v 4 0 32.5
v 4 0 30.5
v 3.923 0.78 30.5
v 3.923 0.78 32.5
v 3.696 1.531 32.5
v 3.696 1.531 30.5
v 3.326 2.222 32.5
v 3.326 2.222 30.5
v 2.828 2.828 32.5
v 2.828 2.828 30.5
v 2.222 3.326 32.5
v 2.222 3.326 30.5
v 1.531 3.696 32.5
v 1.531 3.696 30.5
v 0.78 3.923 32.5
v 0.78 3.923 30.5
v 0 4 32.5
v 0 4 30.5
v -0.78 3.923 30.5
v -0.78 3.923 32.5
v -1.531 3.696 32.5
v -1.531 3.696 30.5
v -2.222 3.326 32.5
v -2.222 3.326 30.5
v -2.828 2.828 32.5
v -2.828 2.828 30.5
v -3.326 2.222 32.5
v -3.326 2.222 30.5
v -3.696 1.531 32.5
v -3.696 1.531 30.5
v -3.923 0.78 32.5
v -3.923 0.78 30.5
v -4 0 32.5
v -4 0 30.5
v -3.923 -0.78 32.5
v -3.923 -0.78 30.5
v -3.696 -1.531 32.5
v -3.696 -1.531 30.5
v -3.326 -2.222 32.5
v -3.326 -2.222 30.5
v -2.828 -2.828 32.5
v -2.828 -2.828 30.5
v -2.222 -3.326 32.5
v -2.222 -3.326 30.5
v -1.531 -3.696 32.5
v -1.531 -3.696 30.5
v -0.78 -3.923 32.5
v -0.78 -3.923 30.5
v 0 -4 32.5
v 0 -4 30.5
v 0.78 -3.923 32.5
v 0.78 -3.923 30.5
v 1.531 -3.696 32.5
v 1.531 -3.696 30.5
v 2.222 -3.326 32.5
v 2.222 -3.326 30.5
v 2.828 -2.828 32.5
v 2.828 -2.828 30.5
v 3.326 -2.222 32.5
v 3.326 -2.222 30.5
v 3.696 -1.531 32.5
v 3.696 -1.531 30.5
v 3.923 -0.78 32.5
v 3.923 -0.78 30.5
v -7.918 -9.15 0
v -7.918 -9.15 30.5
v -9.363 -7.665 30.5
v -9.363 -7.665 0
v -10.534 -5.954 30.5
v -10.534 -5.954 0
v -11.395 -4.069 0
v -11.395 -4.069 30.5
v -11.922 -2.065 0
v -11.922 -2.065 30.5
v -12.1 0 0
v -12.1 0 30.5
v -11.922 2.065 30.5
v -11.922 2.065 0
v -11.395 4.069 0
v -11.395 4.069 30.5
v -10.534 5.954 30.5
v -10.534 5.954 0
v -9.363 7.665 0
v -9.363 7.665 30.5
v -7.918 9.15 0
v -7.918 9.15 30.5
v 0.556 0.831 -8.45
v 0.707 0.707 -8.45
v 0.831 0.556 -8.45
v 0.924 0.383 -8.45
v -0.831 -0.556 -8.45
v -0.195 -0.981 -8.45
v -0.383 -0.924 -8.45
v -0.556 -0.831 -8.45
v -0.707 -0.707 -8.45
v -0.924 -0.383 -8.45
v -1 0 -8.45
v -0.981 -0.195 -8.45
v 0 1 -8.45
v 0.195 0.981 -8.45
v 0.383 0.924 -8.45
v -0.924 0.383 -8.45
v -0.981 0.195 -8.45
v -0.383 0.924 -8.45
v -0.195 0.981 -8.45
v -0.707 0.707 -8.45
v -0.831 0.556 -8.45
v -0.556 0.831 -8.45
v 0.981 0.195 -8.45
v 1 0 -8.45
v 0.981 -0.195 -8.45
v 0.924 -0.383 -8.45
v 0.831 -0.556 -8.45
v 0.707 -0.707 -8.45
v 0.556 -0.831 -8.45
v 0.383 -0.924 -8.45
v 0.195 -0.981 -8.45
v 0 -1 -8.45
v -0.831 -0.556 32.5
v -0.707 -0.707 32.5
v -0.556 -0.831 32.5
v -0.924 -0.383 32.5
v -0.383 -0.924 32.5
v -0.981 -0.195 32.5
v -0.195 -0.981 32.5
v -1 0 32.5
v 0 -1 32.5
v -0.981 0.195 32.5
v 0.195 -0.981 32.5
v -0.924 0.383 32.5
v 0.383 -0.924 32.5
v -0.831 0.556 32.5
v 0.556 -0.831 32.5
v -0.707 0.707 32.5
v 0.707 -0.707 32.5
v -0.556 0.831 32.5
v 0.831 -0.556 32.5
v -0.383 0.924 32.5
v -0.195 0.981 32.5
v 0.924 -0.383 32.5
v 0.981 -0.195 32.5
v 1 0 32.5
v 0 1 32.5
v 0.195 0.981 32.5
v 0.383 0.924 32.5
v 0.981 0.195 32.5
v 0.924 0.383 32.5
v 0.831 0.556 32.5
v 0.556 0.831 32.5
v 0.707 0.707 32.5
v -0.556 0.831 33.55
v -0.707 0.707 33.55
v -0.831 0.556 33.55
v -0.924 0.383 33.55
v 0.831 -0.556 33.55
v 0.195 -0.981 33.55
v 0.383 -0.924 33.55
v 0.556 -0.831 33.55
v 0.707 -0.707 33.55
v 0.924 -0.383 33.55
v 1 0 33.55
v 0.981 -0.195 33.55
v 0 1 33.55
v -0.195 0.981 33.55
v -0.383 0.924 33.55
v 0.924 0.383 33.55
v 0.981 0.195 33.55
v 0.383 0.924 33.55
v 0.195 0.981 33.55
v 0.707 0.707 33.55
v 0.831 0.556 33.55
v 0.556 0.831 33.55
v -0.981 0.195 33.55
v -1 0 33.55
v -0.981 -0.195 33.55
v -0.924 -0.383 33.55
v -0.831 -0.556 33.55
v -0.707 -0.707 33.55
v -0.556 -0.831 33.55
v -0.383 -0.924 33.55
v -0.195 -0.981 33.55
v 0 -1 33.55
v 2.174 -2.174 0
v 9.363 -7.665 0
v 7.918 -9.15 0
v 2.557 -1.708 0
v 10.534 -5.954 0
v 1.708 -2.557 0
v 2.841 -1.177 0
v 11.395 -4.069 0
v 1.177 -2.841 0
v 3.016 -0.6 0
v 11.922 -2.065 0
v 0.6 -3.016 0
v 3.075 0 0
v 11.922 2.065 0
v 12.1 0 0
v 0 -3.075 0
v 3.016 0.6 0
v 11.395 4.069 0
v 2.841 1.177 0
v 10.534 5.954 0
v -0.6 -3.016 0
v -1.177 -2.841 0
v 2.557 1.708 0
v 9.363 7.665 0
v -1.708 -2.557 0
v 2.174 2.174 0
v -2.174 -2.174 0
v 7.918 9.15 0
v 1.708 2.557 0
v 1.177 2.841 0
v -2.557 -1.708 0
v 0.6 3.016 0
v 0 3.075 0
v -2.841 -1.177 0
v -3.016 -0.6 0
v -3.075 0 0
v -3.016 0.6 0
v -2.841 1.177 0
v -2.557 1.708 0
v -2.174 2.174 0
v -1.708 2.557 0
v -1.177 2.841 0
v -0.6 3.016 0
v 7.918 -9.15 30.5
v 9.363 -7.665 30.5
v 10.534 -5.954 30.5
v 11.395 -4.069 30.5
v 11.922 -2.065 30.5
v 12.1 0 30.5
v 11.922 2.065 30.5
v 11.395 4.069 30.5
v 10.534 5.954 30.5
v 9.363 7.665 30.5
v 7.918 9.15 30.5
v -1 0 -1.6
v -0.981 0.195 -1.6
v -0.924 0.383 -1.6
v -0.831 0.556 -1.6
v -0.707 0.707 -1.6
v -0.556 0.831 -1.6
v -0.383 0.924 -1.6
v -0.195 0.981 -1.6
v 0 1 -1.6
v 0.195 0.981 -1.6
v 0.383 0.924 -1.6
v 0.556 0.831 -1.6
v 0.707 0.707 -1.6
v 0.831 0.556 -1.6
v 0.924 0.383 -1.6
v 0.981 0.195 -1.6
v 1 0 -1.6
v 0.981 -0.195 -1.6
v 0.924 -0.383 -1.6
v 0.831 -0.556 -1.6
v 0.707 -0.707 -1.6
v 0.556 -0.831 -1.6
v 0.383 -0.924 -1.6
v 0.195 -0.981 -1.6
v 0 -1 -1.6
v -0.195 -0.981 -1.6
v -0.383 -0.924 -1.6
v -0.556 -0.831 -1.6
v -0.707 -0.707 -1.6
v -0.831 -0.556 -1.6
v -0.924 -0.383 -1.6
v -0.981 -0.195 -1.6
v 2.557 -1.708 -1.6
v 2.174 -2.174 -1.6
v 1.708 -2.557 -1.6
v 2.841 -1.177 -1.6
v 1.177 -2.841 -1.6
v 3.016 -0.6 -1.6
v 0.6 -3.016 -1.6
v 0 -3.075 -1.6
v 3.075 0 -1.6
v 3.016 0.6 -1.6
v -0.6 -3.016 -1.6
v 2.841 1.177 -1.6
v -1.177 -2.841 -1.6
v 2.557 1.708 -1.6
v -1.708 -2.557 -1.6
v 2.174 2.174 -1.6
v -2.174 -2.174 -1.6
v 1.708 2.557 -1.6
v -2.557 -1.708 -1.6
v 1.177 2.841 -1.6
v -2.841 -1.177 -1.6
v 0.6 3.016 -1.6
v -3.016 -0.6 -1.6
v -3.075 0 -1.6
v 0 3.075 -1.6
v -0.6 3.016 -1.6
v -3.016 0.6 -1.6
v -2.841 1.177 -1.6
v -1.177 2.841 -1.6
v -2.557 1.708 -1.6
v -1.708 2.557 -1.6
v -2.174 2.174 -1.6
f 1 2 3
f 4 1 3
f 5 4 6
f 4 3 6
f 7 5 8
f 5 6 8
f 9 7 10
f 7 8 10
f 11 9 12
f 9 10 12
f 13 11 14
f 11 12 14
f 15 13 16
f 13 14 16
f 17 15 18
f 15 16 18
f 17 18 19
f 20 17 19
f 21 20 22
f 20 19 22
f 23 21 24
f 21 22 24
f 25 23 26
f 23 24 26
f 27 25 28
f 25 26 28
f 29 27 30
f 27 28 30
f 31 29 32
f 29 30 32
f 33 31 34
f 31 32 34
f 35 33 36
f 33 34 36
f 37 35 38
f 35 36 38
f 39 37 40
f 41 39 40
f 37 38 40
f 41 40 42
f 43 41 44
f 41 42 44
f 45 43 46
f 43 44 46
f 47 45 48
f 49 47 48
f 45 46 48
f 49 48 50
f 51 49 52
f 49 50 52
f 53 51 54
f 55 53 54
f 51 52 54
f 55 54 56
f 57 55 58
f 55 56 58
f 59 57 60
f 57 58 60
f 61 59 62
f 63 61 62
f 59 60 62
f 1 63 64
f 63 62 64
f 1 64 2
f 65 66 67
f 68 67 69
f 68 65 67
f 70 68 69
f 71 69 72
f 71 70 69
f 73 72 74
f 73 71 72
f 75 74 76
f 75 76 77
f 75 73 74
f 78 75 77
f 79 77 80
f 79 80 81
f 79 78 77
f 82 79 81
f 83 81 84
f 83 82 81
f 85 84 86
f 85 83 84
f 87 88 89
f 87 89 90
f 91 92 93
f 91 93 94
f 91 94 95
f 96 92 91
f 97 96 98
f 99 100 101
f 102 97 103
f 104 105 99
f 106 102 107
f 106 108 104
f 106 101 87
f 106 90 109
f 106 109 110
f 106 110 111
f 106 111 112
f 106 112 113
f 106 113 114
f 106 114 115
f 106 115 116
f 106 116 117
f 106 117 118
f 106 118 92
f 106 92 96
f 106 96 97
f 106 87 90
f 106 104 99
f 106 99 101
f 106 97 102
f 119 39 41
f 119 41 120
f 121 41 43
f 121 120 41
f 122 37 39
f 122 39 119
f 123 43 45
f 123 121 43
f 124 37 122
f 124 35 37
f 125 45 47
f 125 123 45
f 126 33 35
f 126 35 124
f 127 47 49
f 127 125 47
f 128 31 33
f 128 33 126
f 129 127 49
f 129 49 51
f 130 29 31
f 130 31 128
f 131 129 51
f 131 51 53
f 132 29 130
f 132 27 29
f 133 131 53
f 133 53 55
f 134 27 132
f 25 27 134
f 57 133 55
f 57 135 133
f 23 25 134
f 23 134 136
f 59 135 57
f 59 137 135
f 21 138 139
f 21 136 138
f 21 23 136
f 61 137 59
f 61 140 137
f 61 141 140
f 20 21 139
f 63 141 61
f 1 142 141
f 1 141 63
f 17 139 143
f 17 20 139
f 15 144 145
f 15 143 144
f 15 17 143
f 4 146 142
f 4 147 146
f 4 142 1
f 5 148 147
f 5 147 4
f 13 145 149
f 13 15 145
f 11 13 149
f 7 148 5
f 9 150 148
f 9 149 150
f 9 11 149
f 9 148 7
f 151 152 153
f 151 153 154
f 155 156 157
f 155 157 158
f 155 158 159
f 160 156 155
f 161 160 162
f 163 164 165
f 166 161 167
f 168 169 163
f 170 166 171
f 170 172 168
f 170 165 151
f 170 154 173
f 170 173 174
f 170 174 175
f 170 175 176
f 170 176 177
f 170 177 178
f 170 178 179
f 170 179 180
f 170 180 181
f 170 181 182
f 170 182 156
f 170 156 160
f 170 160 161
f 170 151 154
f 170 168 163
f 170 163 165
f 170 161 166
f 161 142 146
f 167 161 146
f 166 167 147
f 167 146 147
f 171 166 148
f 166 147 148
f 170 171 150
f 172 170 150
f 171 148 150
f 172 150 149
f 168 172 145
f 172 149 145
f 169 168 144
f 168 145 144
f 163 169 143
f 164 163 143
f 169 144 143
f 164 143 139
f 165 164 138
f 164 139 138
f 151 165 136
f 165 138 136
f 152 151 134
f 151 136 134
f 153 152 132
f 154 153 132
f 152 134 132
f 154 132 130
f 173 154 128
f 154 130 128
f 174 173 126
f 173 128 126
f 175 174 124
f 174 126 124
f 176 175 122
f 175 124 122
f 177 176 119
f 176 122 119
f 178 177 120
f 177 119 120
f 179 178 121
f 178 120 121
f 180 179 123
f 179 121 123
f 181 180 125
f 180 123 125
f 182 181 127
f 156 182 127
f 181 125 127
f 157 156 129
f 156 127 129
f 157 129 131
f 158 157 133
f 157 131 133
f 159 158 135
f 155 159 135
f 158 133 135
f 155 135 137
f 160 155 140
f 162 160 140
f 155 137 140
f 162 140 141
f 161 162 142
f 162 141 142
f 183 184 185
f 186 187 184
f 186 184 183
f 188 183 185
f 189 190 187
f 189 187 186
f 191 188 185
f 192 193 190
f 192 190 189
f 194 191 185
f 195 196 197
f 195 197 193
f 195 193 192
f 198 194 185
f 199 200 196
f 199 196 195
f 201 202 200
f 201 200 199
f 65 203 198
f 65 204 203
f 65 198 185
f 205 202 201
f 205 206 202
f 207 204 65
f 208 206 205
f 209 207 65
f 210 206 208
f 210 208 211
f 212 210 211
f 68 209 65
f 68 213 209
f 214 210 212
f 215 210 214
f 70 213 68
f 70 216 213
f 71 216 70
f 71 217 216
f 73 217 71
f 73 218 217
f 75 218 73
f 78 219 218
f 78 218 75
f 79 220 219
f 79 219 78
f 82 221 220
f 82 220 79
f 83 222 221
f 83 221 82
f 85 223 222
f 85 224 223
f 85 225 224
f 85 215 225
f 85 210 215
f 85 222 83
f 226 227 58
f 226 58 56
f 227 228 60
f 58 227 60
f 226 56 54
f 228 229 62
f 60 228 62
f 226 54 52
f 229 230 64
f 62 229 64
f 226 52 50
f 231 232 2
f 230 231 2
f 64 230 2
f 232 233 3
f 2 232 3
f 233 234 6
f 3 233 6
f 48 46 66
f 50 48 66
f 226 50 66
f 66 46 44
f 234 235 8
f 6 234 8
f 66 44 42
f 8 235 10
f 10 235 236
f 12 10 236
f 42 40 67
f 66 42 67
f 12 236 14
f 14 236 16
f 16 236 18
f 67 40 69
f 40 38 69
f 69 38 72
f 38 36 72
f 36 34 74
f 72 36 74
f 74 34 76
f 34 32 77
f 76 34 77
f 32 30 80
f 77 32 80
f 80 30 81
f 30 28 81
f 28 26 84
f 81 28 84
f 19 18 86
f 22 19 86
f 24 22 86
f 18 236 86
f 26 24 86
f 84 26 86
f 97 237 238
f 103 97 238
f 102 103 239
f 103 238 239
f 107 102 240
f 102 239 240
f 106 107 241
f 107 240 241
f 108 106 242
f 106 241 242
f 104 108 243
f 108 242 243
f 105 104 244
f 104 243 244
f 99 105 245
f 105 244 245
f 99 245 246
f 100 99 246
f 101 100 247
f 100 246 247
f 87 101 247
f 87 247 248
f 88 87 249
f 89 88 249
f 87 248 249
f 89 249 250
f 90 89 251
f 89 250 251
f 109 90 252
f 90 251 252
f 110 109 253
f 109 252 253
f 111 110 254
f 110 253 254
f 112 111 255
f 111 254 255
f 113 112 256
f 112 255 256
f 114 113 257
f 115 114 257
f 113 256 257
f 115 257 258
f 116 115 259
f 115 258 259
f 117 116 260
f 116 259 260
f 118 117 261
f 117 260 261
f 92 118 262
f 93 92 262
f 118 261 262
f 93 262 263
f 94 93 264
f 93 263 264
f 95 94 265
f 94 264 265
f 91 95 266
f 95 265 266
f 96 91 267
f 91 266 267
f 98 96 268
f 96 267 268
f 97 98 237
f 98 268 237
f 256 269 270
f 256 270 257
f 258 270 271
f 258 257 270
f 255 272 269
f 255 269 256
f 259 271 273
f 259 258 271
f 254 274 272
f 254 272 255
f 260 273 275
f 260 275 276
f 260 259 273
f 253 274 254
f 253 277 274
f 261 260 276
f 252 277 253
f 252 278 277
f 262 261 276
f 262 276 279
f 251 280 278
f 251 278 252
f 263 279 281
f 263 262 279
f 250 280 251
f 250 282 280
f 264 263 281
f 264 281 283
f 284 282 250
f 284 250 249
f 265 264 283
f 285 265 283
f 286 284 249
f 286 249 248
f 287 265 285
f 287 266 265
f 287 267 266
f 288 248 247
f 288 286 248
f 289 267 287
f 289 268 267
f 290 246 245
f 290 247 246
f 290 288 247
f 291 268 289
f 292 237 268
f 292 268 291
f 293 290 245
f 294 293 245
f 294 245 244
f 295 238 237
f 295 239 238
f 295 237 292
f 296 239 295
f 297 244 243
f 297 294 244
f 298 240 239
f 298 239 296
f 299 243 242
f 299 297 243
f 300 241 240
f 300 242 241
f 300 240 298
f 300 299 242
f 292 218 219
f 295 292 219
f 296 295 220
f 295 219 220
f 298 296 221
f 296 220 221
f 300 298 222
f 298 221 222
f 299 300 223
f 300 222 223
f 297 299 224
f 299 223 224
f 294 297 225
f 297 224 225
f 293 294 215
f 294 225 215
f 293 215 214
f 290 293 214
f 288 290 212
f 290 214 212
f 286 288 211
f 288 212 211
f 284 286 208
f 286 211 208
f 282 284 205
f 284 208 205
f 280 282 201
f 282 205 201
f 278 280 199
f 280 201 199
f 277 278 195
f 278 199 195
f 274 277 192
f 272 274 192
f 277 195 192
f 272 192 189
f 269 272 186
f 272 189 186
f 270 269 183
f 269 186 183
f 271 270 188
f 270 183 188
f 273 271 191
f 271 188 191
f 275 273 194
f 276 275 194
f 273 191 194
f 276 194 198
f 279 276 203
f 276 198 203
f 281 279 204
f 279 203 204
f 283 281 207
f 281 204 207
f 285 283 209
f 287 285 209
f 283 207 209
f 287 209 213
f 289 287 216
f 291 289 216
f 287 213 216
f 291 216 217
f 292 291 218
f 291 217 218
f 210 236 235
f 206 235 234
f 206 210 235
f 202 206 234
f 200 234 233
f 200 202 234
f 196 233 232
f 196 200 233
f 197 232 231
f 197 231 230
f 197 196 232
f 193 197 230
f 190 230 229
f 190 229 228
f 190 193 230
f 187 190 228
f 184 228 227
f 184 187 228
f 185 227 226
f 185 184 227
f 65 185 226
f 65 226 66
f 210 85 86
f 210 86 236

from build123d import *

# Parameters (mm, degrees)
BOSS_EXTRUDE1_DEPTH = 30.5
SKETCH2_R           = 3.075
BOSS_EXTRUDE2_DEPTH = 1.6
SKETCH3_R           = 1
BOSS_EXTRUDE3_DEPTH = 6.85
SKETCH4_R           = 4
BOSS_EXTRUDE4_DEPTH = 2
SKETCH5_R           = 1
BOSS_EXTRUDE5_DEPTH = 1.05


with BuildPart() as part:
    # Sketch1 → Boss-Extrude1 (new body)
    with BuildSketch(Plane.XY):
        with BuildLine():
            Line((-7.917543811, 9.15), (7.917543811, 9.15))
            ThreePointArc((7.917543811, 9.15), (12.1, 0), (7.917543811, -9.15))
            Line((7.917543811, -9.15), (-7.917543811, -9.15))
            ThreePointArc((-7.917543811, -9.15), (-12.1, 0), (-7.917543811, 9.15))
        make_face()
    extrude(amount=BOSS_EXTRUDE1_DEPTH)

    # Sketch2 → Boss-Extrude2 (add)
    with BuildSketch(Plane(origin=(0, 0, 0), x_dir=(-1, 0, 0), z_dir=(0, 0, -1))):
        Circle(SKETCH2_R)
    extrude(amount=BOSS_EXTRUDE2_DEPTH)

    # Sketch3 → Boss-Extrude3 (add)
    with BuildSketch(Plane(origin=(0, 0, -1.6), x_dir=(-1, 0, 0), z_dir=(0, 0, -1))):
        Circle(SKETCH3_R)
    extrude(amount=BOSS_EXTRUDE3_DEPTH)

    # Sketch4 → Boss-Extrude4 (add)
    with BuildSketch(Plane.XY.offset(30.5)):
        Circle(SKETCH4_R)
    extrude(amount=BOSS_EXTRUDE4_DEPTH)

    # Sketch5 → Boss-Extrude5 (add)
    with BuildSketch(Plane.XY.offset(32.5)):
        Circle(SKETCH5_R)
    extrude(amount=BOSS_EXTRUDE5_DEPTH)


solid = part.part
